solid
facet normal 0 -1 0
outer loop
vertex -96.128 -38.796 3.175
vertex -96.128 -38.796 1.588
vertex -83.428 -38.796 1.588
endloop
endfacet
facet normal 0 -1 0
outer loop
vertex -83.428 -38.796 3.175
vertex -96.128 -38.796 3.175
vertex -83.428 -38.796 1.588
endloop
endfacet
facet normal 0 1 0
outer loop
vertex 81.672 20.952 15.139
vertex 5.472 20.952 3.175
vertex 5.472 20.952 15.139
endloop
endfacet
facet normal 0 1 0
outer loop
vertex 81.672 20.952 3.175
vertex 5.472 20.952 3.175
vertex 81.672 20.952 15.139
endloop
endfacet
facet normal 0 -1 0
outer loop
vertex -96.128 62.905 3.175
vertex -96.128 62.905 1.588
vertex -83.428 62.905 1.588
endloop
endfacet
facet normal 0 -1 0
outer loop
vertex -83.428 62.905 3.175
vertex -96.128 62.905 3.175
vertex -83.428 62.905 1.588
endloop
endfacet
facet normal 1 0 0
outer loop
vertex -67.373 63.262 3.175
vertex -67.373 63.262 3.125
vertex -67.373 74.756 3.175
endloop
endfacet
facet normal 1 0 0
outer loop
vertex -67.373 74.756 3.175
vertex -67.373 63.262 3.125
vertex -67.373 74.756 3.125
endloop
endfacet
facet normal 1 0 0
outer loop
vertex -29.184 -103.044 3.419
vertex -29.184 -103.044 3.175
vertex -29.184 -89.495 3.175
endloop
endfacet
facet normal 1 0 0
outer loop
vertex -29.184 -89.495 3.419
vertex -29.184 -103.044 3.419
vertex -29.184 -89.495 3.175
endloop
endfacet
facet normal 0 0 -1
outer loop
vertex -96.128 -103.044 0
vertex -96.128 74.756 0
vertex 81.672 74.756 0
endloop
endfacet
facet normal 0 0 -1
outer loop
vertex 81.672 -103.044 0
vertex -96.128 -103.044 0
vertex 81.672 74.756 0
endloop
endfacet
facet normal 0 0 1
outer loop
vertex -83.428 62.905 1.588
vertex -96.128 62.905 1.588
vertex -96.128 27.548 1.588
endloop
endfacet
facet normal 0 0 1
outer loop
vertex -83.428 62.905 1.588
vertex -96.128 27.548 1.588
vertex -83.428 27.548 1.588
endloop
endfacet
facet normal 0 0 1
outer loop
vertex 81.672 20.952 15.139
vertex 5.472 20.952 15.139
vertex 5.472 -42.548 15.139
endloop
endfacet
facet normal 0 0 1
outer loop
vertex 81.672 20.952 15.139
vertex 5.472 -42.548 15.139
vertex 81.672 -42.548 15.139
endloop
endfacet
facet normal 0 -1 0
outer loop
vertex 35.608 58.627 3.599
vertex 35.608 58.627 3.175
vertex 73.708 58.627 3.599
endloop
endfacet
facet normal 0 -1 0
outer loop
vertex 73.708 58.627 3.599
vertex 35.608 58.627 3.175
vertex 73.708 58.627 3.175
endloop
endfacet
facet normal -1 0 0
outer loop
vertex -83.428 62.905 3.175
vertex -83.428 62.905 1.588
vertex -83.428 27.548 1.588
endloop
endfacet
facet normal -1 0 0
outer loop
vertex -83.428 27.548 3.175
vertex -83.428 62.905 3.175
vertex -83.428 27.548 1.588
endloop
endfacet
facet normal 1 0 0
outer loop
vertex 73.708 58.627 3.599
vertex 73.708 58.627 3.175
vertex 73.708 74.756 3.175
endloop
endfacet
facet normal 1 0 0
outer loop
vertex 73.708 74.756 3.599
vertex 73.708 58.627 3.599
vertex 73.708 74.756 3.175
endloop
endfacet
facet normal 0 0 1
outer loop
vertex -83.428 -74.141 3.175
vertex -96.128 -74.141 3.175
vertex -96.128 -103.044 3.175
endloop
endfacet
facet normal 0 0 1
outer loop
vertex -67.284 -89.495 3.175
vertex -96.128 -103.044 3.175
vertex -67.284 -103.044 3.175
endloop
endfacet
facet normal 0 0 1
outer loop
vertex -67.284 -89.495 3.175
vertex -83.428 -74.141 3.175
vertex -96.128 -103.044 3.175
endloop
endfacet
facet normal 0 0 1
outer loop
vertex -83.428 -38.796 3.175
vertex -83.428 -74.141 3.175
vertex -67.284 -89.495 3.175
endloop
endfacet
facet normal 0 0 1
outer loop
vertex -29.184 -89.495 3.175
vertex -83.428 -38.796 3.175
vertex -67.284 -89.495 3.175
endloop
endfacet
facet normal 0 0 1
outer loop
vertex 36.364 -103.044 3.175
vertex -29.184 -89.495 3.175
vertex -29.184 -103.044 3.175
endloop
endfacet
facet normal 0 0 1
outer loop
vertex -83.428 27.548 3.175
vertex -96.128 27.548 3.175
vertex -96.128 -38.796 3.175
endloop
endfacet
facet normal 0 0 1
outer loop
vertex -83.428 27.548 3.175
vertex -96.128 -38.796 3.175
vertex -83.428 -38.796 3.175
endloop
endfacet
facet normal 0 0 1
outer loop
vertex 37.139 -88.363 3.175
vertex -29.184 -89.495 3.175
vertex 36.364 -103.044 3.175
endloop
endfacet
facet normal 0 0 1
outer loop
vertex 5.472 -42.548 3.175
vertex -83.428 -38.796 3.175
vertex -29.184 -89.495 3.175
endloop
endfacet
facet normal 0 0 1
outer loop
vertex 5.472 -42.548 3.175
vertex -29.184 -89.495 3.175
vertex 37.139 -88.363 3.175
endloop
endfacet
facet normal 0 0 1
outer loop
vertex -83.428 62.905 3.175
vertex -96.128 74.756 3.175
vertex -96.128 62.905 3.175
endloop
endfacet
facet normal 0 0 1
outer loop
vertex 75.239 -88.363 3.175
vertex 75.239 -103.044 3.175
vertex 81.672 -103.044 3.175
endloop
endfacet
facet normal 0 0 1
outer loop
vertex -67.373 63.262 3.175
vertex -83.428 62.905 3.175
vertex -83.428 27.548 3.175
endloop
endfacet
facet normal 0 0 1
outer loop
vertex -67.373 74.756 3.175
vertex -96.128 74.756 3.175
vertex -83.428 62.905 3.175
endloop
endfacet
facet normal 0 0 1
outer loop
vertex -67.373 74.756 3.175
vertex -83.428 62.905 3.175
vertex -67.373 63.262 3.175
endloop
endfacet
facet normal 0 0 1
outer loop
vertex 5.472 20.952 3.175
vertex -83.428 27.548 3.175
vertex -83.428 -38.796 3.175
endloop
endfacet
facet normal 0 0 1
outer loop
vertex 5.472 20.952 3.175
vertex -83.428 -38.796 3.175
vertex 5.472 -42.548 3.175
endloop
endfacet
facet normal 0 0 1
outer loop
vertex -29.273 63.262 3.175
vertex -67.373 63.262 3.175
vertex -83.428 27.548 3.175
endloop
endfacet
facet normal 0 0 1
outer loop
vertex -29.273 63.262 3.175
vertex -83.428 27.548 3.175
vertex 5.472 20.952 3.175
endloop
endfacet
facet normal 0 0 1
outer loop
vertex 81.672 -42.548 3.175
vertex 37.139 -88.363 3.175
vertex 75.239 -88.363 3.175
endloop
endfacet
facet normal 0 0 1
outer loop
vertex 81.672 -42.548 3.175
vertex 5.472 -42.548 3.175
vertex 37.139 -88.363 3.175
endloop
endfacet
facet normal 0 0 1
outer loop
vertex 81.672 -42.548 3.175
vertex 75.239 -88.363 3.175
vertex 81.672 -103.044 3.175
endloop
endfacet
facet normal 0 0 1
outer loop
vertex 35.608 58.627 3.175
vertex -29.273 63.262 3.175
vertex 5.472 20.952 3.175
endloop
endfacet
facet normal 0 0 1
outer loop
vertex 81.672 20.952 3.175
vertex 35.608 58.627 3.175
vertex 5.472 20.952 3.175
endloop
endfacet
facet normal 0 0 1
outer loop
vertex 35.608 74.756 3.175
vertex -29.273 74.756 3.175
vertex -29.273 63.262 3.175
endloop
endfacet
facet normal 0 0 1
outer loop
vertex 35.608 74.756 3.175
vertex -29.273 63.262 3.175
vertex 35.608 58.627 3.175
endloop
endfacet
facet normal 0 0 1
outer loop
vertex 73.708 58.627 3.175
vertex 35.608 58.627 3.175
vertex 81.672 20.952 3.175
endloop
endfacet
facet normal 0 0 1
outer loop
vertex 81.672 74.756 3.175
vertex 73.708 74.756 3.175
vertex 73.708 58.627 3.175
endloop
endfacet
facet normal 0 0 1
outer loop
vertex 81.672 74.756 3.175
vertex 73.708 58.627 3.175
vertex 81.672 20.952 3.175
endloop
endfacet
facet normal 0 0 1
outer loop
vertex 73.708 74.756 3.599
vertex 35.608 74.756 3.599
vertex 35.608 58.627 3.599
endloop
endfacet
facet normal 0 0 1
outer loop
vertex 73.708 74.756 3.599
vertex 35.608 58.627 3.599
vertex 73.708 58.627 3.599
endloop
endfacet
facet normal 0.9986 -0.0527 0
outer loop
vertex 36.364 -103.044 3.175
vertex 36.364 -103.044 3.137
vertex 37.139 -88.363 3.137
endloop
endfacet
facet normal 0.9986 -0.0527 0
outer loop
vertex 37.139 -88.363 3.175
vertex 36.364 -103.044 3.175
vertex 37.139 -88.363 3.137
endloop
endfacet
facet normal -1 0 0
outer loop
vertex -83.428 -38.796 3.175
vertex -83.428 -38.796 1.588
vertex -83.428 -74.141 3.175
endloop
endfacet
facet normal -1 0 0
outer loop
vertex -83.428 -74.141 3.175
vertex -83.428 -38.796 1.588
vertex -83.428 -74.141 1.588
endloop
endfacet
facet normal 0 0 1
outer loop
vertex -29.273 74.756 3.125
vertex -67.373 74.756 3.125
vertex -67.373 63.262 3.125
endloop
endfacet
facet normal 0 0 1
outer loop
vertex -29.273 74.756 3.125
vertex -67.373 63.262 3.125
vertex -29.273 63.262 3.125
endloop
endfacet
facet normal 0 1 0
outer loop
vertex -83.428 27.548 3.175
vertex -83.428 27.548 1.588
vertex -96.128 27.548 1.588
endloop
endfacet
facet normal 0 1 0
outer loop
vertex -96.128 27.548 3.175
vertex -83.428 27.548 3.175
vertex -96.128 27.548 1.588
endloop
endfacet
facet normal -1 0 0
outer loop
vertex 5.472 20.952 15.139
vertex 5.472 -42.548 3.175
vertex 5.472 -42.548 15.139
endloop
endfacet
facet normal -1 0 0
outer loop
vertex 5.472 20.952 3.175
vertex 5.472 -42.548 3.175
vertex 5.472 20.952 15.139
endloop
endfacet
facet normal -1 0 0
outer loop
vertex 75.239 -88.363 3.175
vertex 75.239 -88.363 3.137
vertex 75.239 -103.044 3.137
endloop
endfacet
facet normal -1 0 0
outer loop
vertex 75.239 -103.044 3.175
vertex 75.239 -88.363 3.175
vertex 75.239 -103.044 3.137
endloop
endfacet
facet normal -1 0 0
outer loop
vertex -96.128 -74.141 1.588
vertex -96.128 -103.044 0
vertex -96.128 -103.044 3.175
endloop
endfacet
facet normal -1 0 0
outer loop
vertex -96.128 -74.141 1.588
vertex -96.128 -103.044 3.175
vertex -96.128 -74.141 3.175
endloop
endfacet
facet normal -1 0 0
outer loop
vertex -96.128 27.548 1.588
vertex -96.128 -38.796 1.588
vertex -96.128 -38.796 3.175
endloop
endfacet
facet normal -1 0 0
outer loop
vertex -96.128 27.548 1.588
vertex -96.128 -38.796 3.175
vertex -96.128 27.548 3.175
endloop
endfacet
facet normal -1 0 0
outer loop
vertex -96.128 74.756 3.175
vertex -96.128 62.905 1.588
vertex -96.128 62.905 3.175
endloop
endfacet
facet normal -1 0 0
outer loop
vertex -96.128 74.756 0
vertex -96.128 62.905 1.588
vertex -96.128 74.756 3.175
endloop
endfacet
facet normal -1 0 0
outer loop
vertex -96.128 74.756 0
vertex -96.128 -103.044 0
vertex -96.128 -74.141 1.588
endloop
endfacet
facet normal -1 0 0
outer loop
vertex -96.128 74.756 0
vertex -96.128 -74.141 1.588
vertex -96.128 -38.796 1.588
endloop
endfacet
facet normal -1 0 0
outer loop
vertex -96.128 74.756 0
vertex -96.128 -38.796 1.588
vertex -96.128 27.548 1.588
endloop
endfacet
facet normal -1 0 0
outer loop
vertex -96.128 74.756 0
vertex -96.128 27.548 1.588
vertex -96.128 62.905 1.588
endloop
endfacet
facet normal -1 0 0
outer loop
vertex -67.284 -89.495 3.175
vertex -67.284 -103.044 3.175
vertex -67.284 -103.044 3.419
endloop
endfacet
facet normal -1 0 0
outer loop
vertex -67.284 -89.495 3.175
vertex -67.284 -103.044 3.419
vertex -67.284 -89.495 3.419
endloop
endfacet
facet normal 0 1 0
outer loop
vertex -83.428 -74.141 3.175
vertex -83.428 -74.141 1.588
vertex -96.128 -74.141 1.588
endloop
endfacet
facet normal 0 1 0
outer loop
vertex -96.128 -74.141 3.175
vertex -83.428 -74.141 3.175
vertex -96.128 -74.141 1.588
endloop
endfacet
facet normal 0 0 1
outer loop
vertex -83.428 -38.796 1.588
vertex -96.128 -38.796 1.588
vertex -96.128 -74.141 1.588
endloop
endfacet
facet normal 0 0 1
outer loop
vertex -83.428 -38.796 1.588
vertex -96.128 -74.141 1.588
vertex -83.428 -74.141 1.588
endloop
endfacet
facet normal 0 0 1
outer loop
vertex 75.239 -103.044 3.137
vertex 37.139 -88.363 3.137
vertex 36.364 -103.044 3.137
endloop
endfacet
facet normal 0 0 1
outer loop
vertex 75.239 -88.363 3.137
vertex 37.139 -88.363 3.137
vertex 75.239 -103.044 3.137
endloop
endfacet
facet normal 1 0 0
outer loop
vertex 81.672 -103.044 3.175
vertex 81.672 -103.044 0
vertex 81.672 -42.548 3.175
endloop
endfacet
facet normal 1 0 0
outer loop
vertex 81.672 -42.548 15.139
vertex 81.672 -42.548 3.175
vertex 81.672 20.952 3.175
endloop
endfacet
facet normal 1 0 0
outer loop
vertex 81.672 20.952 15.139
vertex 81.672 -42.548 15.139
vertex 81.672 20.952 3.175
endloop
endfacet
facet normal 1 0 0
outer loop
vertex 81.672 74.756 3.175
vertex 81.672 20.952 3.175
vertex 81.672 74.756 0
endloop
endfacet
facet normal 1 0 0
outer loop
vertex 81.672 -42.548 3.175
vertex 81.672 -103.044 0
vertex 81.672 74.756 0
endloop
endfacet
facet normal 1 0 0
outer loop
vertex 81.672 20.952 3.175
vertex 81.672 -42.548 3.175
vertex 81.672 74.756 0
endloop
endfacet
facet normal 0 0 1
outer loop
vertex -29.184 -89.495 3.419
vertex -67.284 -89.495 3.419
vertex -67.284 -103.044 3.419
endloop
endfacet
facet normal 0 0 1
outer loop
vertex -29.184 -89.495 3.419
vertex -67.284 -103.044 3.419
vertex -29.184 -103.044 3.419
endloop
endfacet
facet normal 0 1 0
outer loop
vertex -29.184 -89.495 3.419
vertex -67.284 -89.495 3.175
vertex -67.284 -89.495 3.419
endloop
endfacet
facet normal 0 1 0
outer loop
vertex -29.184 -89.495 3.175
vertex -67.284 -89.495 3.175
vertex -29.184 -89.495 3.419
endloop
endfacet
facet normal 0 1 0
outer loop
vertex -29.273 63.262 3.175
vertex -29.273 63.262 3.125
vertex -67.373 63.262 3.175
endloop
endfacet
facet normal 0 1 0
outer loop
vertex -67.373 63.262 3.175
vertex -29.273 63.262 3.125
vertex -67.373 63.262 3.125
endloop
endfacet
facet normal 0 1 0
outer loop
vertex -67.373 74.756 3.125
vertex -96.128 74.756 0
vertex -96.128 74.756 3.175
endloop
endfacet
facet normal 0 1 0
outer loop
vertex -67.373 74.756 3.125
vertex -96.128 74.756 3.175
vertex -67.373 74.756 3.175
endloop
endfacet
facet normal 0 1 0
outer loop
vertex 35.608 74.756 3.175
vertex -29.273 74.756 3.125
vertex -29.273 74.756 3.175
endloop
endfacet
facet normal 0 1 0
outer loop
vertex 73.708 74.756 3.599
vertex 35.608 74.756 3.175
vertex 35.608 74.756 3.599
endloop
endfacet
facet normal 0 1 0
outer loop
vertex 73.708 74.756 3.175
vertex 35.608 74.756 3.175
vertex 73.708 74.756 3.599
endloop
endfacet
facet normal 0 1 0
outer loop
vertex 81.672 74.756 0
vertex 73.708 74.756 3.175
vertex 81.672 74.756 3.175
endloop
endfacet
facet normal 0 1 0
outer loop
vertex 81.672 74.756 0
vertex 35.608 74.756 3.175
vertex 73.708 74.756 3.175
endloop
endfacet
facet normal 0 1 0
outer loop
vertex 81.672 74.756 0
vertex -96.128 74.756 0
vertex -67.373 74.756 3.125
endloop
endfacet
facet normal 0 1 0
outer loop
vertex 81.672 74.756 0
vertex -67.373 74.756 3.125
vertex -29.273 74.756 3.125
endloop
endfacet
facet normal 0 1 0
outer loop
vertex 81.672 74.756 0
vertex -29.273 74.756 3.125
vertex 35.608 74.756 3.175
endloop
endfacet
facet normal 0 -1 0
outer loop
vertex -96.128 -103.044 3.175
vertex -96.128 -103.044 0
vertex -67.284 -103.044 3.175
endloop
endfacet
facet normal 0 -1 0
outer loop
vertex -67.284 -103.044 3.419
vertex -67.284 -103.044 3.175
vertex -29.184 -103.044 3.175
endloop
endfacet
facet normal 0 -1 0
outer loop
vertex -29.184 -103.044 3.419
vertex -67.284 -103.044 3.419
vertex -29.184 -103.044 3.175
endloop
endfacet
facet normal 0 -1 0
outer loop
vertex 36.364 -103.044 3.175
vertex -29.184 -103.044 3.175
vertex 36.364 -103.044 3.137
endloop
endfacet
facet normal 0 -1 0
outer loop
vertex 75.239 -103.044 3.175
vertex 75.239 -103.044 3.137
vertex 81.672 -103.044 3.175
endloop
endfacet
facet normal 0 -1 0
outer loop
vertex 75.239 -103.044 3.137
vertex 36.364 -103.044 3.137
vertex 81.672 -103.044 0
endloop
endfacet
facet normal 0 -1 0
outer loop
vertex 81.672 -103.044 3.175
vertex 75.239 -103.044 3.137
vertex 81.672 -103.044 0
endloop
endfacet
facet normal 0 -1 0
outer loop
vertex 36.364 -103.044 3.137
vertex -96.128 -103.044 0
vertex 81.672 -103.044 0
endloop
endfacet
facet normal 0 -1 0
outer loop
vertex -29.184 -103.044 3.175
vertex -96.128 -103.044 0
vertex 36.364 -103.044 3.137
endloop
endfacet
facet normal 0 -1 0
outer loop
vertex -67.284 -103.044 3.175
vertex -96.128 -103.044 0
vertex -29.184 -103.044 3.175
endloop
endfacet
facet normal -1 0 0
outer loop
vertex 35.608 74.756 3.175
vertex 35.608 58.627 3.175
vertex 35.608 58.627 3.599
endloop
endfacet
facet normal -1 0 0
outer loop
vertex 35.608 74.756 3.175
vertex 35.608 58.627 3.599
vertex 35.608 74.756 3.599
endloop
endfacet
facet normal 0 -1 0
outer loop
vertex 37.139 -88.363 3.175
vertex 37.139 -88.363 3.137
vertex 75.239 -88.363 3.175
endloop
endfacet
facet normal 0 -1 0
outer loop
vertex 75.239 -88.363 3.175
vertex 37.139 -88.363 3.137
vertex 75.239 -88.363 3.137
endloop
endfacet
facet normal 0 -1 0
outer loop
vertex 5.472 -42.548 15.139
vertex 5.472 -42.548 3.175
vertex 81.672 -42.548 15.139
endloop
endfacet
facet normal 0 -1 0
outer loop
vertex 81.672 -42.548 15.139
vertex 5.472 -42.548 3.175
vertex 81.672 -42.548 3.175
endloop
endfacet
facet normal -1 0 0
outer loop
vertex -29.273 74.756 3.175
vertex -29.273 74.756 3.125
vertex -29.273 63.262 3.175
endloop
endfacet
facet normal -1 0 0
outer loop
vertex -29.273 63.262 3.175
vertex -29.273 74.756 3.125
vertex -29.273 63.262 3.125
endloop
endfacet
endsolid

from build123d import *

# Parameters (mm, degrees)
F1_DEPTH = 3.175
F0_W     = 12.7
F0_H     = 35.3568
F0_H_2   = 35.3450775146
F2_DEPTH = 1.5875
F0_W_2   = 76.2
F0_H_3   = 63.5
F3_DEPTH = 1.5875
F0_W_3   = 38.1
F0_H_4   = 13.5492910243
F4_DEPTH = 3.41914
F5_DEPTH = 3.13733
F0_H_5   = 11.4938615345
F6_DEPTH = 3.12486
F0_H_6   = 16.1283126556
F7_DEPTH = 3.5988
F8_DEPTH = 13.55152


with BuildPart() as f1:
    # F0 (on Top) → F1 (new body)
    with BuildSketch(Plane.XY):
        Polygon((-67.3727616668, 74.7556908511), (-96.1277933359, 74.7556908511), (-96.1277933359, 62.904787178), (-83.4277933359, 62.904787178), (-83.4277933359, 27.547987178), (-96.1277933359, 27.547987178), (-96.1277933359, -38.7955904007), (-83.4277933359, -38.7955904007), (-83.4277933359, -74.1406679153), (-96.1277933359, -74.1406679153), (-96.1277933359, -103.0443091489), (-67.2837272286, -103.0443091489), (-67.2837272286, -89.4950181246), (-29.1837272286, -89.4950181246), (-29.1837272286, -103.0443091489), (36.3641157746, -103.0443091489), (37.1394492686, -88.3632972836), (75.2394492686, -88.3632972836), (75.2394492686, -103.0443091489), (81.6722066641, -103.0443091489), (81.6722066641, -42.5480678678), (5.4722066641, -42.5480678678), (5.4722066641, 20.9519321322), (81.6722066641, 20.9519321322), (81.6722066641, 74.7556908511), (73.7083251536, 74.7556908511), (73.7083251536, 58.6273781955), (35.6083251536, 58.6273781955), (35.6083251536, 74.7556908511), (-29.2727616668, 74.7556908511), (-29.2727616668, 63.2618293166), (-67.3727616668, 63.2618293166), align=None)
    extrude(amount=F1_DEPTH)

    # F0 (on Top) → F2 (join)
    with BuildSketch(Plane.XY):
        with Locations((-89.7777933359, 45.226387178)):
            Rectangle(F0_W, F0_H)
        with Locations((-89.7777933359, -56.468129158)):
            Rectangle(F0_W, F0_H_2)
    extrude(amount=F2_DEPTH)

    # F0 (on Top) → F3 (join)
    with BuildSketch(Plane.XY):
        with Locations((43.5722066641, -10.7980678678)):
            Rectangle(F0_W_2, F0_H_3)
    extrude(amount=F3_DEPTH)

    # F0 (on Top) → F4 (join)
    with BuildSketch(Plane.XY):
        with Locations((-48.2337272286, -96.2696636367)):
            Rectangle(F0_W_3, F0_H_4)
    extrude(amount=F4_DEPTH)

    # F0 (on Top) → F5 (join)
    with BuildSketch(Plane.XY):
        Polygon((37.1394492686, -88.3632972836), (36.3641157746, -103.0443091489), (75.2394492686, -103.0443091489), (75.2394492686, -88.3632972836), align=None)
    extrude(amount=F5_DEPTH)

    # F0 (on Top) → F6 (join)
    with BuildSketch(Plane.XY):
        with Locations((-48.3227616668, 69.0087600839)):
            Rectangle(F0_W_3, F0_H_5)
    extrude(amount=F6_DEPTH)

    # F0 (on Top) → F7 (join)
    with BuildSketch(Plane.XY):
        with Locations((54.6583251536, 66.6915345233)):
            Rectangle(F0_W_3, F0_H_6)
    extrude(amount=F7_DEPTH)

    # F8 (add): a face of the model
    f8_faces = [f1.faces().sort_by_distance(p)[0] for p in [
        (43.5722066641, -10.7980678678, 1.5875),
    ]]
    extrude(f8_faces, amount=F8_DEPTH)


solid = f1.part
